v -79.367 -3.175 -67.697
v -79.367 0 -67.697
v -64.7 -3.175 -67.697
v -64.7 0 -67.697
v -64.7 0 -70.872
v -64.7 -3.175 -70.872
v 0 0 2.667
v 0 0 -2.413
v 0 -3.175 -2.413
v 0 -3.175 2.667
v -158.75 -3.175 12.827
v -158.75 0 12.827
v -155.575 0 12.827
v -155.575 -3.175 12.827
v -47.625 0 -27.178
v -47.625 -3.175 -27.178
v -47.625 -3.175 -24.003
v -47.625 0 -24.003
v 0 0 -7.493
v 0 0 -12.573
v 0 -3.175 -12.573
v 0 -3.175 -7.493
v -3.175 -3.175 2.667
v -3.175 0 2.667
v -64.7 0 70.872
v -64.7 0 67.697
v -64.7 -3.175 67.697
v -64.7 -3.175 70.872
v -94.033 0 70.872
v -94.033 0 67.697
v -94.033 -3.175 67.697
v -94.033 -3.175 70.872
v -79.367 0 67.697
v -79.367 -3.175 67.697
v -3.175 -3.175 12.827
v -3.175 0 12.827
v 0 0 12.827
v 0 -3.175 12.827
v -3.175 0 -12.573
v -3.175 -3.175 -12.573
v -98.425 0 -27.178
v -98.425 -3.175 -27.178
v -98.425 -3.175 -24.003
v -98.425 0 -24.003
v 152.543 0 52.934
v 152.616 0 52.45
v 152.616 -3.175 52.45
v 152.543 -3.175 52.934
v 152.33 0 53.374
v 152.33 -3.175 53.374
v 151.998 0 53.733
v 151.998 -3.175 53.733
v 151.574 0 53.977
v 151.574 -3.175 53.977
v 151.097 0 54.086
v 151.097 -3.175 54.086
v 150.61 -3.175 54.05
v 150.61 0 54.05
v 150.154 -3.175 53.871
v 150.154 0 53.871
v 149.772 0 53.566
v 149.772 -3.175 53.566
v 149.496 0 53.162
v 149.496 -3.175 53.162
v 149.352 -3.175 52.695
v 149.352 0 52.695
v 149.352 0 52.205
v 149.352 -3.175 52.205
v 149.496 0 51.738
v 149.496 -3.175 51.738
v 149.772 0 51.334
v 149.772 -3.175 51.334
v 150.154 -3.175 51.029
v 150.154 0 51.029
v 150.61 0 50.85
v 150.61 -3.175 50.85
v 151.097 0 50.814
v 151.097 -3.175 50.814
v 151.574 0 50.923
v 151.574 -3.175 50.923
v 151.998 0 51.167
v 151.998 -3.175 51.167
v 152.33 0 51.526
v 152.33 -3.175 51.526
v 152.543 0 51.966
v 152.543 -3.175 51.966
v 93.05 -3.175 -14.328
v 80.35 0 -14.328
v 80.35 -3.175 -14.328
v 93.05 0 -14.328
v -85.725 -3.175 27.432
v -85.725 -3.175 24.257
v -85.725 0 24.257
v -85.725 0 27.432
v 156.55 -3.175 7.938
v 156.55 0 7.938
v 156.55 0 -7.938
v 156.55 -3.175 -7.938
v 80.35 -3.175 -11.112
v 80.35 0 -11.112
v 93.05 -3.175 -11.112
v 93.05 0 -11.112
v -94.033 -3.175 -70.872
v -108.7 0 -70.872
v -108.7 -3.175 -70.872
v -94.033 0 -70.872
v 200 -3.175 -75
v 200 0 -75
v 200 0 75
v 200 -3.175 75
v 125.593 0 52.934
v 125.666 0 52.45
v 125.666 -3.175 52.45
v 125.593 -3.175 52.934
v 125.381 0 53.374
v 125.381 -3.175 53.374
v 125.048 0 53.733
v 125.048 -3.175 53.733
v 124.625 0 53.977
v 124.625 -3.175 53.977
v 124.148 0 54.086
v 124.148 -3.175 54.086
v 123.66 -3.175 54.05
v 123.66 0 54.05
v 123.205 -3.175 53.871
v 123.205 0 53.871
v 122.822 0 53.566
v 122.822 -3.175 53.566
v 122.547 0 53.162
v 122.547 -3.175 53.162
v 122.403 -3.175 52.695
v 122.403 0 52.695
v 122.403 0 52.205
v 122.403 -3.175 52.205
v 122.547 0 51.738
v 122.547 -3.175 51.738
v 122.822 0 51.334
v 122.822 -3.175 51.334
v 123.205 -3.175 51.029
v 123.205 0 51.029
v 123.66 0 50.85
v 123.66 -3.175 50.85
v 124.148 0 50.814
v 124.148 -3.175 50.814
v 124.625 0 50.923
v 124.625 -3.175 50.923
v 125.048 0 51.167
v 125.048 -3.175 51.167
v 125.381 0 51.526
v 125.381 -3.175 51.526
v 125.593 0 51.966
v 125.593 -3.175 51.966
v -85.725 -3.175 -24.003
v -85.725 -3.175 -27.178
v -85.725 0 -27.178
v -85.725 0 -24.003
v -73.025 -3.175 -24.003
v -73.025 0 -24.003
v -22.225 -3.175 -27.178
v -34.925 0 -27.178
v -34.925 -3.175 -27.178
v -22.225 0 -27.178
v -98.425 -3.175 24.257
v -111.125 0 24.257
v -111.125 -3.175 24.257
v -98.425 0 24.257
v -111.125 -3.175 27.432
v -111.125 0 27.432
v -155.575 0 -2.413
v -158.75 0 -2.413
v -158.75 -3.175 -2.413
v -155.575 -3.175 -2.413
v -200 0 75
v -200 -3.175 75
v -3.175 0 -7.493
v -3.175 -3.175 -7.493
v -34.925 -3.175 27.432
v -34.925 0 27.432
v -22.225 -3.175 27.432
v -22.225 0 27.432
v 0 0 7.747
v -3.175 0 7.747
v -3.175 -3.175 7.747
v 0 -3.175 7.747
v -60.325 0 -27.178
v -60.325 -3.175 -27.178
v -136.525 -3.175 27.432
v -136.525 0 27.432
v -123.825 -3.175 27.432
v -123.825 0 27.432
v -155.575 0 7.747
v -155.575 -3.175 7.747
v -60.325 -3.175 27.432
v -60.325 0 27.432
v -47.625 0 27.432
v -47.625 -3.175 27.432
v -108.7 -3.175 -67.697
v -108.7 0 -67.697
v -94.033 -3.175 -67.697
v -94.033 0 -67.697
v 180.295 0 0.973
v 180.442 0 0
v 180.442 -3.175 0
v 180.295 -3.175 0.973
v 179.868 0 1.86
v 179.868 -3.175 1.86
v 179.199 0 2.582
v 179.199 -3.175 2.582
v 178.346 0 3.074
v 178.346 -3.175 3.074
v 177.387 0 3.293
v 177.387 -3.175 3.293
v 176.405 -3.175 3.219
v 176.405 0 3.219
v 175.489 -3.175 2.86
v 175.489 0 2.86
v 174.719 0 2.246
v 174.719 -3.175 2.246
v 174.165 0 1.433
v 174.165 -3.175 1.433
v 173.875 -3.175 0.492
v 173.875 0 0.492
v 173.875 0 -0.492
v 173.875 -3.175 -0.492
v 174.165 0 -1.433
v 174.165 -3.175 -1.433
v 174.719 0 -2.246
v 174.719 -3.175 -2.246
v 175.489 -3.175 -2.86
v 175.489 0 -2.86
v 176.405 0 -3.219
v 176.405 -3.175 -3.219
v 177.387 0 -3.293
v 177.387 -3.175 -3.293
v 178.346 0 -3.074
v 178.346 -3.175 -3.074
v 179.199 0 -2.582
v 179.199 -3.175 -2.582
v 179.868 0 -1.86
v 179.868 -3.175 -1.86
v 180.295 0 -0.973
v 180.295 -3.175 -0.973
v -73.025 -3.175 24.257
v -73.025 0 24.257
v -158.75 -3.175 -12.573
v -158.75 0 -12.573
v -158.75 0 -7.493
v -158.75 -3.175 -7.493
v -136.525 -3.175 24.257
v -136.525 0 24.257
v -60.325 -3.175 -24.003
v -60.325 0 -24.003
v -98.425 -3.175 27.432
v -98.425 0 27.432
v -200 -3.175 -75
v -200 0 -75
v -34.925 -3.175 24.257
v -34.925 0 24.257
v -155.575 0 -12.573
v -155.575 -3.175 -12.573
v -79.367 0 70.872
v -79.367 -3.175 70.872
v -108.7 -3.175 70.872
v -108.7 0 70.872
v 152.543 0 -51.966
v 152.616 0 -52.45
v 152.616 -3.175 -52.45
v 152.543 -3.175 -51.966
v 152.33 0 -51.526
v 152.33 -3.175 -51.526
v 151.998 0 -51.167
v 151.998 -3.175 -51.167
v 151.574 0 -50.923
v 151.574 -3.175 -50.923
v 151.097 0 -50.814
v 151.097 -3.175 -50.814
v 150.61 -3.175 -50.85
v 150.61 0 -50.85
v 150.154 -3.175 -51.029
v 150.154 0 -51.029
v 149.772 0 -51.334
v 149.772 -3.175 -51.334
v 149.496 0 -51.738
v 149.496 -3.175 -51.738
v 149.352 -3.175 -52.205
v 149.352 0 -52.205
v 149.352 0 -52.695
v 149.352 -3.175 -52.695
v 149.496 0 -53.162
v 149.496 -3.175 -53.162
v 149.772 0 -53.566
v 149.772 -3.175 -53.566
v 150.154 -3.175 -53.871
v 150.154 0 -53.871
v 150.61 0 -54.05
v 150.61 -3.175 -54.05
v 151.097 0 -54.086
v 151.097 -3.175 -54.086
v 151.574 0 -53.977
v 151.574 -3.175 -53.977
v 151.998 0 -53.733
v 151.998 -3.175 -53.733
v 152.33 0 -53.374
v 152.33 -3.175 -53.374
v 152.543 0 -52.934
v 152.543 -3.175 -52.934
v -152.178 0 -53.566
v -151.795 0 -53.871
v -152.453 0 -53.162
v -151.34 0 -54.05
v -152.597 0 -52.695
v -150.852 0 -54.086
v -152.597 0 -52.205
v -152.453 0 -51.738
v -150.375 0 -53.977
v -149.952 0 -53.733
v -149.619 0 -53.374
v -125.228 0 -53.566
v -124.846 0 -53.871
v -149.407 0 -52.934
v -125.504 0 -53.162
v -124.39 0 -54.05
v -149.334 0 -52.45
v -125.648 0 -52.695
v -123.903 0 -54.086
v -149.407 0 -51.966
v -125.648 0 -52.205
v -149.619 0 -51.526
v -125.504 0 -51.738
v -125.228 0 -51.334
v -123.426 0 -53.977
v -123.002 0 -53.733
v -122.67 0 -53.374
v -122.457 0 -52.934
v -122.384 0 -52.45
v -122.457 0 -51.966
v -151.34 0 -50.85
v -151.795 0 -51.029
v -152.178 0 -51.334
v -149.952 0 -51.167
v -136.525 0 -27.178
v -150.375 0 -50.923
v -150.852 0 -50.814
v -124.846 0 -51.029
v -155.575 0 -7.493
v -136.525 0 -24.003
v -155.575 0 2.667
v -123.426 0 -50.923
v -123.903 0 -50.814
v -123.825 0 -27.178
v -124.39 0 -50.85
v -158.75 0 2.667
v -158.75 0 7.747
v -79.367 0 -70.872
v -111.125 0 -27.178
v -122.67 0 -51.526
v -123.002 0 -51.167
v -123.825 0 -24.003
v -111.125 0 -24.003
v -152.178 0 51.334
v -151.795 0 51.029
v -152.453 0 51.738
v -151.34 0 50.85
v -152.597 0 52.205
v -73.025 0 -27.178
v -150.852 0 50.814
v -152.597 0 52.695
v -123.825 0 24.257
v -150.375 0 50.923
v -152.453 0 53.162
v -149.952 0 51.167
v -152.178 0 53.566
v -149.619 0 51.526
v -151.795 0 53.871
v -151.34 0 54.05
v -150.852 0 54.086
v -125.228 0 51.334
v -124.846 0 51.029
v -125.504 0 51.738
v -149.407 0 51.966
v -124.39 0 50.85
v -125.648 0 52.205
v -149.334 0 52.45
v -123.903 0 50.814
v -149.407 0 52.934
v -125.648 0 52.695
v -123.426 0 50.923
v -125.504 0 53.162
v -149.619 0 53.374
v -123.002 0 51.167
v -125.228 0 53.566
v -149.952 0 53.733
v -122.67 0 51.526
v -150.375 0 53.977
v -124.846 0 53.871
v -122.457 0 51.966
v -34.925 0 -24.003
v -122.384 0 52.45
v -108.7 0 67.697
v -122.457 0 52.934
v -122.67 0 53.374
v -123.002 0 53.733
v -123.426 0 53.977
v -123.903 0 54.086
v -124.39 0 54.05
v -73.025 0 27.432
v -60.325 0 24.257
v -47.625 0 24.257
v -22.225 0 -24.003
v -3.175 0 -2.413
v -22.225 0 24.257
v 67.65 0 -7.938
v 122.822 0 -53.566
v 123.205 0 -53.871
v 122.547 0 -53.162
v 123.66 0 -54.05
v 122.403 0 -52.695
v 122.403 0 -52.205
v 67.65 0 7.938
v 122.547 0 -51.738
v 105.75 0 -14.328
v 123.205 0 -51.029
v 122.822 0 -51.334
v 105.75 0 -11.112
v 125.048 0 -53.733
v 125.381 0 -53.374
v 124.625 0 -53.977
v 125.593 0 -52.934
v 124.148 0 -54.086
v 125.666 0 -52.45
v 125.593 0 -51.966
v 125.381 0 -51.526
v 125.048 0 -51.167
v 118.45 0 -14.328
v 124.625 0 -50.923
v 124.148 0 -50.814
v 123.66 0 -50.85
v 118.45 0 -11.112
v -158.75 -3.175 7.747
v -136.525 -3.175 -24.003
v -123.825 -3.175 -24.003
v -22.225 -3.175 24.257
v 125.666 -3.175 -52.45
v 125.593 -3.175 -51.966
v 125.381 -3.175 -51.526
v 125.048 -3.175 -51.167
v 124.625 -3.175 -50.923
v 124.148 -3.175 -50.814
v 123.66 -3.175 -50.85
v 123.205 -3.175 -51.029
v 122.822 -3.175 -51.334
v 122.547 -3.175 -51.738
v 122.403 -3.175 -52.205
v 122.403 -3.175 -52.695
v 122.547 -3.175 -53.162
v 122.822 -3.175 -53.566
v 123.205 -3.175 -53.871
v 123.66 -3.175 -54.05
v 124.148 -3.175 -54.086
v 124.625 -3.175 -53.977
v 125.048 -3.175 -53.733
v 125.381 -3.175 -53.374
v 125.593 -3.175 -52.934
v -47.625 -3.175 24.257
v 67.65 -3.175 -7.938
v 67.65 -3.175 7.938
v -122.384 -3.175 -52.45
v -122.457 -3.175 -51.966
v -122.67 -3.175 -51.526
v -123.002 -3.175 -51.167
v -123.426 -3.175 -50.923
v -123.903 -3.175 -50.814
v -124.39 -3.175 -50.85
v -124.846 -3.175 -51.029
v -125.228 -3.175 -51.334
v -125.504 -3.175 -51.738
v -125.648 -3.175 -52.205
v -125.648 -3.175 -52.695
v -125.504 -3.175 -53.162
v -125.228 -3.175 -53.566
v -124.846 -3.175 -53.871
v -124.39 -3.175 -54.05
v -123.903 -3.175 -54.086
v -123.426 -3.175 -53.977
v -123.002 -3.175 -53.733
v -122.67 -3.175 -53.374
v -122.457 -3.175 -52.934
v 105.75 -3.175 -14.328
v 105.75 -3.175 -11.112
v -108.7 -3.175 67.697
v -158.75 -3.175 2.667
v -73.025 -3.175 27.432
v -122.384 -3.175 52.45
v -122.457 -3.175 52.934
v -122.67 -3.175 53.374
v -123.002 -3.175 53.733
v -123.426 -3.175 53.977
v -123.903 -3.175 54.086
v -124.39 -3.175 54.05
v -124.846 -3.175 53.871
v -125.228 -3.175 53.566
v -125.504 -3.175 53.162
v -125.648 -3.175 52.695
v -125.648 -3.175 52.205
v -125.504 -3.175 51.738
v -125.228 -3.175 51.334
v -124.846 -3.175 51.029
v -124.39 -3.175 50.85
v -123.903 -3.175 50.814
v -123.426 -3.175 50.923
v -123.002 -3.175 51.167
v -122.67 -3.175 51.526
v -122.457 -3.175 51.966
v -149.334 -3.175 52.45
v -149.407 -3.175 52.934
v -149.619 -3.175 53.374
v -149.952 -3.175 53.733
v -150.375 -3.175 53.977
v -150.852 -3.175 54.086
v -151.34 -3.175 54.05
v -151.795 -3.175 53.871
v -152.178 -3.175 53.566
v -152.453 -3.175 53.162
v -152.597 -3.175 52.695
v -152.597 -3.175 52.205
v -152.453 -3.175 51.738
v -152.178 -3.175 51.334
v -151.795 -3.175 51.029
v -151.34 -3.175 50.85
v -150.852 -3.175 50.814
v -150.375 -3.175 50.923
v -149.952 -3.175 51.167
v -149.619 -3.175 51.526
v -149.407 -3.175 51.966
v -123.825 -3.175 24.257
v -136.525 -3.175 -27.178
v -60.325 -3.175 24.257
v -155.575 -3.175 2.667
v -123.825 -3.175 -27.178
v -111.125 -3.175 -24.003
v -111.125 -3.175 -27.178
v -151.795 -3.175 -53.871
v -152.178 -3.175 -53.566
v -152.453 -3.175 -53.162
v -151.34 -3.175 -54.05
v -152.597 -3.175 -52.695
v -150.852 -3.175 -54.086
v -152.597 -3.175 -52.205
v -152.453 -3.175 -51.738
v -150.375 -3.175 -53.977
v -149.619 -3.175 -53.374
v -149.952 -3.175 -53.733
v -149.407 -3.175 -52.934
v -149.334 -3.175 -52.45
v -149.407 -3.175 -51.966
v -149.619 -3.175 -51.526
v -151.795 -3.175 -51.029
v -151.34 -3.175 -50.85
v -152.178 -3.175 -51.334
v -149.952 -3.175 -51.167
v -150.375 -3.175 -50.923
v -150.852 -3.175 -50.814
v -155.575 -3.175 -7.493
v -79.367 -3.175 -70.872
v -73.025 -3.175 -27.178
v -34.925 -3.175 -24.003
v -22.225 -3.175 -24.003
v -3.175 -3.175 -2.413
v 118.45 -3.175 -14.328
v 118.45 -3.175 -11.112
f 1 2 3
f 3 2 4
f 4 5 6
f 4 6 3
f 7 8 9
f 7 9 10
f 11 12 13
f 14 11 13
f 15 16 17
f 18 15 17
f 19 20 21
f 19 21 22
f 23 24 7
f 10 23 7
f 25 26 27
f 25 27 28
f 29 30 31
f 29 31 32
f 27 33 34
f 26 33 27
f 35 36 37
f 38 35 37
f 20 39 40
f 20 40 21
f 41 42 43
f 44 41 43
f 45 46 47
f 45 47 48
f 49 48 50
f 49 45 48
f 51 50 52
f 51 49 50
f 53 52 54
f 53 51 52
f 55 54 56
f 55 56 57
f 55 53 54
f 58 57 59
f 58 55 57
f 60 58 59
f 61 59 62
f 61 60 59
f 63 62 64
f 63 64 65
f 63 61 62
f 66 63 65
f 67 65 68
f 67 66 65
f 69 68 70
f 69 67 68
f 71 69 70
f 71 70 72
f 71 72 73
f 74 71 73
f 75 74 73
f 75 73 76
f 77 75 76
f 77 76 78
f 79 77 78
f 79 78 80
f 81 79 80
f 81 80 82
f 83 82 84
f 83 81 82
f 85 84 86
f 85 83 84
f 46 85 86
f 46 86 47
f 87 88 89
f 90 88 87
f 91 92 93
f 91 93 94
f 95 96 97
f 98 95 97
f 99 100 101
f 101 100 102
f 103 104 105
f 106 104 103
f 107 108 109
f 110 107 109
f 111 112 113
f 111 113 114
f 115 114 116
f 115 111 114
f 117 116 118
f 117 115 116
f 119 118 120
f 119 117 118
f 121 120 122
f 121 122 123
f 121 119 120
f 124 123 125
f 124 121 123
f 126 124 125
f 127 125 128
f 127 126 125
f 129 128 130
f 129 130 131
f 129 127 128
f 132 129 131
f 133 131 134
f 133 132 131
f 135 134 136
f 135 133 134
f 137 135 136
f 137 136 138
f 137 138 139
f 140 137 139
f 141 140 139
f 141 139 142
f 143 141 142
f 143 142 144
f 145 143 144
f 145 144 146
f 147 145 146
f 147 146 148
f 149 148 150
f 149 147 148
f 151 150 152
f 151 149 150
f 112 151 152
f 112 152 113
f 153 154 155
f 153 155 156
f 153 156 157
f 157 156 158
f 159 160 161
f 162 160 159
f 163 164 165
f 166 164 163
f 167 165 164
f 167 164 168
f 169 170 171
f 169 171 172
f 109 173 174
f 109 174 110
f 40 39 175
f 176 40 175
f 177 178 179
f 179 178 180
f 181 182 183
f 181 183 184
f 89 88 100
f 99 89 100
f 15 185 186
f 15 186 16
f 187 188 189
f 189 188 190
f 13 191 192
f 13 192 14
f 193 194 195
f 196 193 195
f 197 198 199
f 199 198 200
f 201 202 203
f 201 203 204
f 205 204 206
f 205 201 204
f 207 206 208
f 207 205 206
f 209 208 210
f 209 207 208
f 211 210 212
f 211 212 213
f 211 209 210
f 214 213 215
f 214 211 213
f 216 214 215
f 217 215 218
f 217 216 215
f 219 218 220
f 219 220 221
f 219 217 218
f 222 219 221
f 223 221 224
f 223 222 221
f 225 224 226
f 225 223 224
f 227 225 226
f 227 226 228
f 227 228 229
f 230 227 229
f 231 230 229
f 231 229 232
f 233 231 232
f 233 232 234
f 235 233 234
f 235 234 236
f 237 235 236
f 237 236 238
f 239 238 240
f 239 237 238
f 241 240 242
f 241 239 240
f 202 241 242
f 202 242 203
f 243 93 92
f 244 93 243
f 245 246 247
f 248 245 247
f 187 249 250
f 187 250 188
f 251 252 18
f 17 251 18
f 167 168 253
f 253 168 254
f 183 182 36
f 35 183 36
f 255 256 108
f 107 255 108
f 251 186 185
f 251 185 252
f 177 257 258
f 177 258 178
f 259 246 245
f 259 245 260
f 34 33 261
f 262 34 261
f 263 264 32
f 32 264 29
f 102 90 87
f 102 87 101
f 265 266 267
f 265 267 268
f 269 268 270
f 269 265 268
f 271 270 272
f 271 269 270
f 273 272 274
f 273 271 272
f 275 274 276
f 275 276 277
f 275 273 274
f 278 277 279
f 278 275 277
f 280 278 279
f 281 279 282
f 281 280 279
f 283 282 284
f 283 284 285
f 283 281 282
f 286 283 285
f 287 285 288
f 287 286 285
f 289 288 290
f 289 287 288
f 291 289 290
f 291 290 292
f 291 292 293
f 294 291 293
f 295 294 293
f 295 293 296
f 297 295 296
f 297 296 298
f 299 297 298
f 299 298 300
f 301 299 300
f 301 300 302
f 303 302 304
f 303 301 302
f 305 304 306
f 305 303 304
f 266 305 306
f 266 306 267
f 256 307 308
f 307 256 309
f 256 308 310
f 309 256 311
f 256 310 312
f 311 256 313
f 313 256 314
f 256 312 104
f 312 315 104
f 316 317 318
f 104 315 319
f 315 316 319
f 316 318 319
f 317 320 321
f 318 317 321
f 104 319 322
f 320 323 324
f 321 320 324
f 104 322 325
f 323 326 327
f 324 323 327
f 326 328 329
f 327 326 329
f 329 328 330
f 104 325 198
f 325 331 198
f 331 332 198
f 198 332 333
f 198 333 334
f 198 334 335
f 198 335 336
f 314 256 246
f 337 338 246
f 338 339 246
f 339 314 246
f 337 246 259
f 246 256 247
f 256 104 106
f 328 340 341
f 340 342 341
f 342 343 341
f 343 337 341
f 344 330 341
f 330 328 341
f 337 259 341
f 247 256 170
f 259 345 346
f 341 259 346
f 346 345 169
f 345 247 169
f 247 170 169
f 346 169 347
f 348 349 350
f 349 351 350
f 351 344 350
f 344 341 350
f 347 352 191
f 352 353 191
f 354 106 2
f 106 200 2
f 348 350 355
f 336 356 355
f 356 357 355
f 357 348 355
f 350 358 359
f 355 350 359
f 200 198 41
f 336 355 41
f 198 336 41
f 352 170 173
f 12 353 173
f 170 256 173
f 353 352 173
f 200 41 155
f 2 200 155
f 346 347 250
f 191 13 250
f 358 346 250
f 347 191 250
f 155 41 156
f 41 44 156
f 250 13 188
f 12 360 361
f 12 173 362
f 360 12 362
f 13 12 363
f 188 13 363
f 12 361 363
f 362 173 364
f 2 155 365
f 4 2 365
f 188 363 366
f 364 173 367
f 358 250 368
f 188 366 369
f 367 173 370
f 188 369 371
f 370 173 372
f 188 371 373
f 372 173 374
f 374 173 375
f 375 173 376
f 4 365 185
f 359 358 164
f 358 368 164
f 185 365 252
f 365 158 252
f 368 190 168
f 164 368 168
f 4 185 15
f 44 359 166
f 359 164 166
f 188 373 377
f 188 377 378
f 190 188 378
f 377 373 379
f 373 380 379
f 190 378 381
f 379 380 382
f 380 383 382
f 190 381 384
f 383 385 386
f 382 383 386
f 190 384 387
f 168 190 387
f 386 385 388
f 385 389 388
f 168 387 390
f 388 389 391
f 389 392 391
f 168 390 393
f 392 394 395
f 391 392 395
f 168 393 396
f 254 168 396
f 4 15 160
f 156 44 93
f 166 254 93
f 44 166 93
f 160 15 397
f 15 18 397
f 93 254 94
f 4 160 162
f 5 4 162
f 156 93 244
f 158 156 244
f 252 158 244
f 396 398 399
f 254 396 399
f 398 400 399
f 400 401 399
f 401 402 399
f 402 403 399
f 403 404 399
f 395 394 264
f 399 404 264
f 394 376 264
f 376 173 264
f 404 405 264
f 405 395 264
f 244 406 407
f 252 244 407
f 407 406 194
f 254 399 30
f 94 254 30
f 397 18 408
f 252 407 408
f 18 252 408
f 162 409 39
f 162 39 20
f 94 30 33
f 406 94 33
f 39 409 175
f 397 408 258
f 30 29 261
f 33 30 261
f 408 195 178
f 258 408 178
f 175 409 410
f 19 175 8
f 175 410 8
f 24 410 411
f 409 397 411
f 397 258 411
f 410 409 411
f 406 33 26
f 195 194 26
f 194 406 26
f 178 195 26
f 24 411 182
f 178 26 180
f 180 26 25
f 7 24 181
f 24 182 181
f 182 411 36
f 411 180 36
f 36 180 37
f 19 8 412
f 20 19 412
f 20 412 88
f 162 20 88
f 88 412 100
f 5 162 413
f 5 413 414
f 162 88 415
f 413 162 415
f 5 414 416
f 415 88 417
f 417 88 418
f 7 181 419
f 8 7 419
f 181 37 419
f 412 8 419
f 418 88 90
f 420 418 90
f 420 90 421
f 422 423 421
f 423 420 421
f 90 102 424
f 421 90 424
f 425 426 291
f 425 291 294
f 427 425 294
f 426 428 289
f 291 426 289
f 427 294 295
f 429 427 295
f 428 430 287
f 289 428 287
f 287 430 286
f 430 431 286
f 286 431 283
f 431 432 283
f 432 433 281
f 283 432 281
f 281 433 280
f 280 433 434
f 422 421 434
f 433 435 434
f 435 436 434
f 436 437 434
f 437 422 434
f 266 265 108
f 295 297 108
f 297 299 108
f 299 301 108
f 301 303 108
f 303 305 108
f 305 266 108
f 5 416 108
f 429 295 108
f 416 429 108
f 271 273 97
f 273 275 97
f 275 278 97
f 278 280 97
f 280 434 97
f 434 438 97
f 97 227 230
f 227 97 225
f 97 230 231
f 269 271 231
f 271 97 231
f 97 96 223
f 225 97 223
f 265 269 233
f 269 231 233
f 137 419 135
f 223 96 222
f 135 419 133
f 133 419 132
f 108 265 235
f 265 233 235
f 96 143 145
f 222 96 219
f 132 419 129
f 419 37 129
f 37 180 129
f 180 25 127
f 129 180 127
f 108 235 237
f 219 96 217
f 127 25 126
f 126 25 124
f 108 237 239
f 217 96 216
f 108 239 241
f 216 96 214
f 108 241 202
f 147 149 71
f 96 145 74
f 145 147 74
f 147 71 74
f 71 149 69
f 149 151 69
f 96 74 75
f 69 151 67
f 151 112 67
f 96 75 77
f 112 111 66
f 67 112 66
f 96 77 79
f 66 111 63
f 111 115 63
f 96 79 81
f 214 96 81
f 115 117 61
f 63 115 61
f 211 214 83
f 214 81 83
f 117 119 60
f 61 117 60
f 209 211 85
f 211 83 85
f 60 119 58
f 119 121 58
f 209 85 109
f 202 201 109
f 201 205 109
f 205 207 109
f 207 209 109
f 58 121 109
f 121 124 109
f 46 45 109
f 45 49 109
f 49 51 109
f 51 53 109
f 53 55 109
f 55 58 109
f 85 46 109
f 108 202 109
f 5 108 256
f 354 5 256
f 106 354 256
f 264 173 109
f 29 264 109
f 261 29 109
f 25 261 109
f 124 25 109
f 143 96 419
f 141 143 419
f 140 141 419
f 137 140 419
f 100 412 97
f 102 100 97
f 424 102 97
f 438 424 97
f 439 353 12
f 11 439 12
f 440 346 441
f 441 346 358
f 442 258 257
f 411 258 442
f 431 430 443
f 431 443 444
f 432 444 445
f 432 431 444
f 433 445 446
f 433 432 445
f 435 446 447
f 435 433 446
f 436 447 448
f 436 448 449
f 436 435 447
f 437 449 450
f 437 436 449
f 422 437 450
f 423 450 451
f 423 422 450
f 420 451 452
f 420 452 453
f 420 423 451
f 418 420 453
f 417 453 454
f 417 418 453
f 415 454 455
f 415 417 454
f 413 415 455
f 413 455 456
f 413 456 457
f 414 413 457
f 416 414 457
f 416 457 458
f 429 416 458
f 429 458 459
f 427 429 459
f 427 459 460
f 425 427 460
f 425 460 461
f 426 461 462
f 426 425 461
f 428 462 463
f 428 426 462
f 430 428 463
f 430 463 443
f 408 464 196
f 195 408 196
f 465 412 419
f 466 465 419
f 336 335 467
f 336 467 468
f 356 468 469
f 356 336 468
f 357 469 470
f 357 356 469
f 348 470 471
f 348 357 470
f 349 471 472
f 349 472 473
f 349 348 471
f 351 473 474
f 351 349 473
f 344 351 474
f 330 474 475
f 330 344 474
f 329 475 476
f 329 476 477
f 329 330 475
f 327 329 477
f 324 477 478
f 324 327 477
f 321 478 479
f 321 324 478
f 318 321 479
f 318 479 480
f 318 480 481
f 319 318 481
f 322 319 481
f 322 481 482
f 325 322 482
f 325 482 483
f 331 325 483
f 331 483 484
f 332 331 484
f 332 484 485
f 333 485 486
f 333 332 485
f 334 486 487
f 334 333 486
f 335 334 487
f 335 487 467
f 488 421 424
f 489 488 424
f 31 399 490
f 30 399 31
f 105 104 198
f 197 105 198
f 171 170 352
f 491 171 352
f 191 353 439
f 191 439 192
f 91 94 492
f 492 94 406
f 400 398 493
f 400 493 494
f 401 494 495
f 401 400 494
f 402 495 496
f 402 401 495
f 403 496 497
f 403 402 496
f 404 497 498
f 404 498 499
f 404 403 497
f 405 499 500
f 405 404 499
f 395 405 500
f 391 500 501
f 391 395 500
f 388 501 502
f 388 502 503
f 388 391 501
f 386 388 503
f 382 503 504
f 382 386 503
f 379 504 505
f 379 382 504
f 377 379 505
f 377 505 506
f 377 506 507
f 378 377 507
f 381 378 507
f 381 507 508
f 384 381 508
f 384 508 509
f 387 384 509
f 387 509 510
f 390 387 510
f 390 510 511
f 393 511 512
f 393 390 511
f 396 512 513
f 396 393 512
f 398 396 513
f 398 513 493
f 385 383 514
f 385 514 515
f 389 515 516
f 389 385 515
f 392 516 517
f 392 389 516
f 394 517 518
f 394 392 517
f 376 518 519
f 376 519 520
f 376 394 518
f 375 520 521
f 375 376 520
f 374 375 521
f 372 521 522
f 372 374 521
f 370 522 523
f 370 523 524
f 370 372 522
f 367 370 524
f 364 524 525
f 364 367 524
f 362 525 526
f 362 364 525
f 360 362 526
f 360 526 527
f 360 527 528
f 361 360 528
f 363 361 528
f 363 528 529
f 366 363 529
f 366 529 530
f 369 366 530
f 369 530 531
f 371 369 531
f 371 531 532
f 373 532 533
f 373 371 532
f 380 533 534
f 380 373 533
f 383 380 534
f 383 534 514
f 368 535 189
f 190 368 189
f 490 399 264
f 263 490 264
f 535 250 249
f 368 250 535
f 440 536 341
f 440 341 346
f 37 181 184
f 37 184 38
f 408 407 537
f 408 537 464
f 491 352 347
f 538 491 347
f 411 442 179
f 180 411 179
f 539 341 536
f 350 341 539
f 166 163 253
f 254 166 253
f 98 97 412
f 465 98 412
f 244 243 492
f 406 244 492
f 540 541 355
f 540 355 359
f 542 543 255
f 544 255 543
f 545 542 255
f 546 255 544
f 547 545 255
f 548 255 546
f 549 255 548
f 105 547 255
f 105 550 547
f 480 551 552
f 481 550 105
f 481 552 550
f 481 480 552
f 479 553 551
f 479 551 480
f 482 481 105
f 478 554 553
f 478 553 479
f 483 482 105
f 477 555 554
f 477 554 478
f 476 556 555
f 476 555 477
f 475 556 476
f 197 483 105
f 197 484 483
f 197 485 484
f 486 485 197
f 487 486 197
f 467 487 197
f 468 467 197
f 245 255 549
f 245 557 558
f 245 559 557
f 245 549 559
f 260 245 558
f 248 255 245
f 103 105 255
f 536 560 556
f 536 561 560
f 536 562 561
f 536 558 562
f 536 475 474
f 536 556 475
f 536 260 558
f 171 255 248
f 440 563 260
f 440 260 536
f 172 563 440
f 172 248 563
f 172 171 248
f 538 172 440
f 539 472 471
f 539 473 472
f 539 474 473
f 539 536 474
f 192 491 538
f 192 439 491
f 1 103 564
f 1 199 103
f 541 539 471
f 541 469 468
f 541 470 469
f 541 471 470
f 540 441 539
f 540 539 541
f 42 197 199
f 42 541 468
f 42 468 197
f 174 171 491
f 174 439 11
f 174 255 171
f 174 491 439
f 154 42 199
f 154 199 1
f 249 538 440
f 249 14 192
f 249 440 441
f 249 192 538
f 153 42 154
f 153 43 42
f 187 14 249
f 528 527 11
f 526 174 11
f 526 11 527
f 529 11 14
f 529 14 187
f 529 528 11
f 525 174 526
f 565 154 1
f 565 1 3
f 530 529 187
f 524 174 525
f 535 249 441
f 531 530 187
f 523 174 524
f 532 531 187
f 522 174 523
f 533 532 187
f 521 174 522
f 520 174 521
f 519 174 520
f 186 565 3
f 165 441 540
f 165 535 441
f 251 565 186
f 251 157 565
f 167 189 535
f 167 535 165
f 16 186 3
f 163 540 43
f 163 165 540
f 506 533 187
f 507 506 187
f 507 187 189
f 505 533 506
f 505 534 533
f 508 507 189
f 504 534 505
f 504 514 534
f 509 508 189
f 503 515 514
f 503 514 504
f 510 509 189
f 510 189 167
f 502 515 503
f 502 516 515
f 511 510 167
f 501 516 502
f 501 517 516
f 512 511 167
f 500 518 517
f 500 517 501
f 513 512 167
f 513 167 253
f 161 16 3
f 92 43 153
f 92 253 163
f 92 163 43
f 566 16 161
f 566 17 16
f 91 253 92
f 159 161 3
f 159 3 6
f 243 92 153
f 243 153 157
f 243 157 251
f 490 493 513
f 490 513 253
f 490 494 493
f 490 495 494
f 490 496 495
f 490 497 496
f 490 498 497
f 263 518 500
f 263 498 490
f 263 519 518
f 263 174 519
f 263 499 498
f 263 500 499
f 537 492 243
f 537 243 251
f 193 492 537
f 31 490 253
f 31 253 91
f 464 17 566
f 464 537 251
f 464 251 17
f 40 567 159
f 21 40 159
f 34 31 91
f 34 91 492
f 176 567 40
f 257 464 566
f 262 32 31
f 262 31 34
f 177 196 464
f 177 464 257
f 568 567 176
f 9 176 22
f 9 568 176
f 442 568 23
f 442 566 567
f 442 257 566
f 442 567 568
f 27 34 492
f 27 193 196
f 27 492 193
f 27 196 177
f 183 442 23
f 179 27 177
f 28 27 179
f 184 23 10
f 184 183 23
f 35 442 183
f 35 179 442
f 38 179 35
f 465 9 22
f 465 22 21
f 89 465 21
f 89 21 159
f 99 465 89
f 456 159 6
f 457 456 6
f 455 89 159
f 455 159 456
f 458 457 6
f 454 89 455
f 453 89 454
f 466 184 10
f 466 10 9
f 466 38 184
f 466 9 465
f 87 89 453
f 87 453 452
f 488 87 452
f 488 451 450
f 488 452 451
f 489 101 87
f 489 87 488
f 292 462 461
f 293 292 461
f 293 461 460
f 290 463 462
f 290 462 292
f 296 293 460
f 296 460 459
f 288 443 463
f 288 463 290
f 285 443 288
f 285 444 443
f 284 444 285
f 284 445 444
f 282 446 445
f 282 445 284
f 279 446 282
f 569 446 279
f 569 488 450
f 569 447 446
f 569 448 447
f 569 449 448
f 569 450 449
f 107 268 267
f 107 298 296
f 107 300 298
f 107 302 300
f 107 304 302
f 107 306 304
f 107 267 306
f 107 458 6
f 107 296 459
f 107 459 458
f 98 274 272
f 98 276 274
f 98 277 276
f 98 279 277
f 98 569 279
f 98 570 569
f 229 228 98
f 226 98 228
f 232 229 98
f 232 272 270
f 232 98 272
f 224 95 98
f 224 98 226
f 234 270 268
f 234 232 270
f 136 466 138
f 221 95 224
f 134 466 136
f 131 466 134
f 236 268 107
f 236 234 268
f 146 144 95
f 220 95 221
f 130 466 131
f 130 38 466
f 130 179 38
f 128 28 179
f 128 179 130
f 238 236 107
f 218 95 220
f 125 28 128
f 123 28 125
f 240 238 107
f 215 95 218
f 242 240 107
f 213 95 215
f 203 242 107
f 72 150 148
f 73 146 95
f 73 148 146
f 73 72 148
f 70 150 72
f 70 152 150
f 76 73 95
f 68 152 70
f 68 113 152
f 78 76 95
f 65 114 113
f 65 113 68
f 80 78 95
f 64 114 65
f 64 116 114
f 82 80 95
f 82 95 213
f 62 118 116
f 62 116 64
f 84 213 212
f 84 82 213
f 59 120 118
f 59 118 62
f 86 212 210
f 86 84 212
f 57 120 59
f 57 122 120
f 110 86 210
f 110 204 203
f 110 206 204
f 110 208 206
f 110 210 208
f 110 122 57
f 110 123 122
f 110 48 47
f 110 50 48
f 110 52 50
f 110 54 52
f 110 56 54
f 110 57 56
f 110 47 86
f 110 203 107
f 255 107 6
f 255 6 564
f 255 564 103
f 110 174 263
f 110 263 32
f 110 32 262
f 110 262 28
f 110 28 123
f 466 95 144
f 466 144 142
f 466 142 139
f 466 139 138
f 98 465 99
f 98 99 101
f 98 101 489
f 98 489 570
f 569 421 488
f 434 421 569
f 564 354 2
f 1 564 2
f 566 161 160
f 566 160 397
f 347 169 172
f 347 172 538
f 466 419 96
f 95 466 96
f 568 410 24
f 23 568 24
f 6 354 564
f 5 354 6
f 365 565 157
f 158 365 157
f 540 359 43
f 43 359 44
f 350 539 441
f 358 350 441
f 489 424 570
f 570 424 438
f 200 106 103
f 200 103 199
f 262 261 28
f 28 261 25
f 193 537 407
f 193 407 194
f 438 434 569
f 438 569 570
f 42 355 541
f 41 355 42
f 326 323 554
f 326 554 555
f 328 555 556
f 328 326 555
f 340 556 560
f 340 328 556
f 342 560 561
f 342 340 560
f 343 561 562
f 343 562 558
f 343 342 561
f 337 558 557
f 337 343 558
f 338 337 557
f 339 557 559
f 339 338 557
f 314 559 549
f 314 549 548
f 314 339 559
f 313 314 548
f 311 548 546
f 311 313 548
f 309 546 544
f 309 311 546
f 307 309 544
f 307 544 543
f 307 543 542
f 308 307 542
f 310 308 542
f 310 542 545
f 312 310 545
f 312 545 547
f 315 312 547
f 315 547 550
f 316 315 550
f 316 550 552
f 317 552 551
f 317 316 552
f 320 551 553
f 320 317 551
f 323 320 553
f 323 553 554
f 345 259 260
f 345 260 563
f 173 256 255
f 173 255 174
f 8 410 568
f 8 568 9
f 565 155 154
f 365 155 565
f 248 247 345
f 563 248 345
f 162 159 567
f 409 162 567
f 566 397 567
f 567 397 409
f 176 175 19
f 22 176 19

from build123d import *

# Parameters (mm, degrees)
F0_W     = 400
F0_H     = 150
F0_W_2   = 14.666667
F0_H_2   = 3.175
F0_R     = 1.64084
F0_W_3   = 12.7
F0_W_4   = 3.175
F0_H_3   = 5.08
F0_H_4   = 3.215846
F0_R_2   = 3.302
F1_DEPTH = 3.175


with BuildPart() as f1:
    # F0 (on Front) → F1 (new body)
    with BuildSketch(Plane.XZ):
        Rectangle(F0_W, F0_H)
        with Locations((-101.366666, -69.285)):
            Rectangle(F0_W_2, F0_H_2, mode=Mode.SUBTRACT)
        with Locations((-150.9747, -52.45)):
            Circle(F0_R, mode=Mode.SUBTRACT)
        with Locations((-124.0253, -52.45)):
            Circle(F0_R, mode=Mode.SUBTRACT)
        with Locations((-72.033333, -69.285)):
            Rectangle(F0_W_2, F0_H_2, mode=Mode.SUBTRACT)
        with Locations((-130.175, -25.590497)):
            Rectangle(F0_W_3, F0_H_2, mode=Mode.SUBTRACT)
        with Locations((-104.775, -25.590497)):
            Rectangle(F0_W_3, F0_H_2, mode=Mode.SUBTRACT)
        with Locations((-157.1625, -10.032997)):
            Rectangle(F0_W_4, F0_H_3, mode=Mode.SUBTRACT)
        with Locations((-79.375, -25.590497)):
            Rectangle(F0_W_3, F0_H_2, mode=Mode.SUBTRACT)
        with Locations((-53.975, -25.590497)):
            Rectangle(F0_W_3, F0_H_2, mode=Mode.SUBTRACT)
        with Locations((-28.575, -25.590497)):
            Rectangle(F0_W_3, F0_H_2, mode=Mode.SUBTRACT)
        with Locations((-1.5875, -10.032997)):
            Rectangle(F0_W_4, F0_H_3, mode=Mode.SUBTRACT)
        with Locations((124.0253, -52.45)):
            Circle(F0_R, mode=Mode.SUBTRACT)
        with Locations((150.9747, -52.45)):
            Circle(F0_R, mode=Mode.SUBTRACT)
        with Locations((86.7, -12.720423)):
            Rectangle(F0_W_3, F0_H_4, mode=Mode.SUBTRACT)
        with Locations((112.1, -12.720423)):
            Rectangle(F0_W_3, F0_H_4, mode=Mode.SUBTRACT)
        with Locations((-157.1625, 0.127003)):
            Rectangle(F0_W_4, F0_H_3, mode=Mode.SUBTRACT)
        with Locations((-157.1625, 10.287003)):
            Rectangle(F0_W_4, F0_H_3, mode=Mode.SUBTRACT)
        with Locations((-130.175, 25.844503)):
            Rectangle(F0_W_3, F0_H_2, mode=Mode.SUBTRACT)
        with Locations((-104.775, 25.844503)):
            Rectangle(F0_W_3, F0_H_2, mode=Mode.SUBTRACT)
        with Locations((-1.5875, 0.127003)):
            Rectangle(F0_W_4, F0_H_3, mode=Mode.SUBTRACT)
        with Locations((-1.5875, 10.287003)):
            Rectangle(F0_W_4, F0_H_3, mode=Mode.SUBTRACT)
        with Locations((-79.375, 25.844503)):
            Rectangle(F0_W_3, F0_H_2, mode=Mode.SUBTRACT)
        with Locations((-53.975, 25.844503)):
            Rectangle(F0_W_3, F0_H_2, mode=Mode.SUBTRACT)
        with Locations((-28.575, 25.844503)):
            Rectangle(F0_W_3, F0_H_2, mode=Mode.SUBTRACT)
        with Locations((-150.9747, 52.45)):
            Circle(F0_R, mode=Mode.SUBTRACT)
        with Locations((-124.0253, 52.45)):
            Circle(F0_R, mode=Mode.SUBTRACT)
        with Locations((-101.366666, 69.285)):
            Rectangle(F0_W_2, F0_H_2, mode=Mode.SUBTRACT)
        with Locations((-72.033333, 69.285)):
            Rectangle(F0_W_2, F0_H_2, mode=Mode.SUBTRACT)
        Polygon((156.55, 7.9375), (156.55, -7.9375), (118.45, -7.9375), (80.35, -7.9375), (67.65, -7.9375), (67.65, 7.9375), (80.35, 7.9375), (118.45, 7.9375), align=None, mode=Mode.SUBTRACT)
        with Locations((177.14, 0)):
            Circle(F0_R_2, mode=Mode.SUBTRACT)
        with Locations((124.0253, 52.45)):
            Circle(F0_R, mode=Mode.SUBTRACT)
        with Locations((150.9747, 52.45)):
            Circle(F0_R, mode=Mode.SUBTRACT)
    extrude(amount=F1_DEPTH)


solid = f1.part
